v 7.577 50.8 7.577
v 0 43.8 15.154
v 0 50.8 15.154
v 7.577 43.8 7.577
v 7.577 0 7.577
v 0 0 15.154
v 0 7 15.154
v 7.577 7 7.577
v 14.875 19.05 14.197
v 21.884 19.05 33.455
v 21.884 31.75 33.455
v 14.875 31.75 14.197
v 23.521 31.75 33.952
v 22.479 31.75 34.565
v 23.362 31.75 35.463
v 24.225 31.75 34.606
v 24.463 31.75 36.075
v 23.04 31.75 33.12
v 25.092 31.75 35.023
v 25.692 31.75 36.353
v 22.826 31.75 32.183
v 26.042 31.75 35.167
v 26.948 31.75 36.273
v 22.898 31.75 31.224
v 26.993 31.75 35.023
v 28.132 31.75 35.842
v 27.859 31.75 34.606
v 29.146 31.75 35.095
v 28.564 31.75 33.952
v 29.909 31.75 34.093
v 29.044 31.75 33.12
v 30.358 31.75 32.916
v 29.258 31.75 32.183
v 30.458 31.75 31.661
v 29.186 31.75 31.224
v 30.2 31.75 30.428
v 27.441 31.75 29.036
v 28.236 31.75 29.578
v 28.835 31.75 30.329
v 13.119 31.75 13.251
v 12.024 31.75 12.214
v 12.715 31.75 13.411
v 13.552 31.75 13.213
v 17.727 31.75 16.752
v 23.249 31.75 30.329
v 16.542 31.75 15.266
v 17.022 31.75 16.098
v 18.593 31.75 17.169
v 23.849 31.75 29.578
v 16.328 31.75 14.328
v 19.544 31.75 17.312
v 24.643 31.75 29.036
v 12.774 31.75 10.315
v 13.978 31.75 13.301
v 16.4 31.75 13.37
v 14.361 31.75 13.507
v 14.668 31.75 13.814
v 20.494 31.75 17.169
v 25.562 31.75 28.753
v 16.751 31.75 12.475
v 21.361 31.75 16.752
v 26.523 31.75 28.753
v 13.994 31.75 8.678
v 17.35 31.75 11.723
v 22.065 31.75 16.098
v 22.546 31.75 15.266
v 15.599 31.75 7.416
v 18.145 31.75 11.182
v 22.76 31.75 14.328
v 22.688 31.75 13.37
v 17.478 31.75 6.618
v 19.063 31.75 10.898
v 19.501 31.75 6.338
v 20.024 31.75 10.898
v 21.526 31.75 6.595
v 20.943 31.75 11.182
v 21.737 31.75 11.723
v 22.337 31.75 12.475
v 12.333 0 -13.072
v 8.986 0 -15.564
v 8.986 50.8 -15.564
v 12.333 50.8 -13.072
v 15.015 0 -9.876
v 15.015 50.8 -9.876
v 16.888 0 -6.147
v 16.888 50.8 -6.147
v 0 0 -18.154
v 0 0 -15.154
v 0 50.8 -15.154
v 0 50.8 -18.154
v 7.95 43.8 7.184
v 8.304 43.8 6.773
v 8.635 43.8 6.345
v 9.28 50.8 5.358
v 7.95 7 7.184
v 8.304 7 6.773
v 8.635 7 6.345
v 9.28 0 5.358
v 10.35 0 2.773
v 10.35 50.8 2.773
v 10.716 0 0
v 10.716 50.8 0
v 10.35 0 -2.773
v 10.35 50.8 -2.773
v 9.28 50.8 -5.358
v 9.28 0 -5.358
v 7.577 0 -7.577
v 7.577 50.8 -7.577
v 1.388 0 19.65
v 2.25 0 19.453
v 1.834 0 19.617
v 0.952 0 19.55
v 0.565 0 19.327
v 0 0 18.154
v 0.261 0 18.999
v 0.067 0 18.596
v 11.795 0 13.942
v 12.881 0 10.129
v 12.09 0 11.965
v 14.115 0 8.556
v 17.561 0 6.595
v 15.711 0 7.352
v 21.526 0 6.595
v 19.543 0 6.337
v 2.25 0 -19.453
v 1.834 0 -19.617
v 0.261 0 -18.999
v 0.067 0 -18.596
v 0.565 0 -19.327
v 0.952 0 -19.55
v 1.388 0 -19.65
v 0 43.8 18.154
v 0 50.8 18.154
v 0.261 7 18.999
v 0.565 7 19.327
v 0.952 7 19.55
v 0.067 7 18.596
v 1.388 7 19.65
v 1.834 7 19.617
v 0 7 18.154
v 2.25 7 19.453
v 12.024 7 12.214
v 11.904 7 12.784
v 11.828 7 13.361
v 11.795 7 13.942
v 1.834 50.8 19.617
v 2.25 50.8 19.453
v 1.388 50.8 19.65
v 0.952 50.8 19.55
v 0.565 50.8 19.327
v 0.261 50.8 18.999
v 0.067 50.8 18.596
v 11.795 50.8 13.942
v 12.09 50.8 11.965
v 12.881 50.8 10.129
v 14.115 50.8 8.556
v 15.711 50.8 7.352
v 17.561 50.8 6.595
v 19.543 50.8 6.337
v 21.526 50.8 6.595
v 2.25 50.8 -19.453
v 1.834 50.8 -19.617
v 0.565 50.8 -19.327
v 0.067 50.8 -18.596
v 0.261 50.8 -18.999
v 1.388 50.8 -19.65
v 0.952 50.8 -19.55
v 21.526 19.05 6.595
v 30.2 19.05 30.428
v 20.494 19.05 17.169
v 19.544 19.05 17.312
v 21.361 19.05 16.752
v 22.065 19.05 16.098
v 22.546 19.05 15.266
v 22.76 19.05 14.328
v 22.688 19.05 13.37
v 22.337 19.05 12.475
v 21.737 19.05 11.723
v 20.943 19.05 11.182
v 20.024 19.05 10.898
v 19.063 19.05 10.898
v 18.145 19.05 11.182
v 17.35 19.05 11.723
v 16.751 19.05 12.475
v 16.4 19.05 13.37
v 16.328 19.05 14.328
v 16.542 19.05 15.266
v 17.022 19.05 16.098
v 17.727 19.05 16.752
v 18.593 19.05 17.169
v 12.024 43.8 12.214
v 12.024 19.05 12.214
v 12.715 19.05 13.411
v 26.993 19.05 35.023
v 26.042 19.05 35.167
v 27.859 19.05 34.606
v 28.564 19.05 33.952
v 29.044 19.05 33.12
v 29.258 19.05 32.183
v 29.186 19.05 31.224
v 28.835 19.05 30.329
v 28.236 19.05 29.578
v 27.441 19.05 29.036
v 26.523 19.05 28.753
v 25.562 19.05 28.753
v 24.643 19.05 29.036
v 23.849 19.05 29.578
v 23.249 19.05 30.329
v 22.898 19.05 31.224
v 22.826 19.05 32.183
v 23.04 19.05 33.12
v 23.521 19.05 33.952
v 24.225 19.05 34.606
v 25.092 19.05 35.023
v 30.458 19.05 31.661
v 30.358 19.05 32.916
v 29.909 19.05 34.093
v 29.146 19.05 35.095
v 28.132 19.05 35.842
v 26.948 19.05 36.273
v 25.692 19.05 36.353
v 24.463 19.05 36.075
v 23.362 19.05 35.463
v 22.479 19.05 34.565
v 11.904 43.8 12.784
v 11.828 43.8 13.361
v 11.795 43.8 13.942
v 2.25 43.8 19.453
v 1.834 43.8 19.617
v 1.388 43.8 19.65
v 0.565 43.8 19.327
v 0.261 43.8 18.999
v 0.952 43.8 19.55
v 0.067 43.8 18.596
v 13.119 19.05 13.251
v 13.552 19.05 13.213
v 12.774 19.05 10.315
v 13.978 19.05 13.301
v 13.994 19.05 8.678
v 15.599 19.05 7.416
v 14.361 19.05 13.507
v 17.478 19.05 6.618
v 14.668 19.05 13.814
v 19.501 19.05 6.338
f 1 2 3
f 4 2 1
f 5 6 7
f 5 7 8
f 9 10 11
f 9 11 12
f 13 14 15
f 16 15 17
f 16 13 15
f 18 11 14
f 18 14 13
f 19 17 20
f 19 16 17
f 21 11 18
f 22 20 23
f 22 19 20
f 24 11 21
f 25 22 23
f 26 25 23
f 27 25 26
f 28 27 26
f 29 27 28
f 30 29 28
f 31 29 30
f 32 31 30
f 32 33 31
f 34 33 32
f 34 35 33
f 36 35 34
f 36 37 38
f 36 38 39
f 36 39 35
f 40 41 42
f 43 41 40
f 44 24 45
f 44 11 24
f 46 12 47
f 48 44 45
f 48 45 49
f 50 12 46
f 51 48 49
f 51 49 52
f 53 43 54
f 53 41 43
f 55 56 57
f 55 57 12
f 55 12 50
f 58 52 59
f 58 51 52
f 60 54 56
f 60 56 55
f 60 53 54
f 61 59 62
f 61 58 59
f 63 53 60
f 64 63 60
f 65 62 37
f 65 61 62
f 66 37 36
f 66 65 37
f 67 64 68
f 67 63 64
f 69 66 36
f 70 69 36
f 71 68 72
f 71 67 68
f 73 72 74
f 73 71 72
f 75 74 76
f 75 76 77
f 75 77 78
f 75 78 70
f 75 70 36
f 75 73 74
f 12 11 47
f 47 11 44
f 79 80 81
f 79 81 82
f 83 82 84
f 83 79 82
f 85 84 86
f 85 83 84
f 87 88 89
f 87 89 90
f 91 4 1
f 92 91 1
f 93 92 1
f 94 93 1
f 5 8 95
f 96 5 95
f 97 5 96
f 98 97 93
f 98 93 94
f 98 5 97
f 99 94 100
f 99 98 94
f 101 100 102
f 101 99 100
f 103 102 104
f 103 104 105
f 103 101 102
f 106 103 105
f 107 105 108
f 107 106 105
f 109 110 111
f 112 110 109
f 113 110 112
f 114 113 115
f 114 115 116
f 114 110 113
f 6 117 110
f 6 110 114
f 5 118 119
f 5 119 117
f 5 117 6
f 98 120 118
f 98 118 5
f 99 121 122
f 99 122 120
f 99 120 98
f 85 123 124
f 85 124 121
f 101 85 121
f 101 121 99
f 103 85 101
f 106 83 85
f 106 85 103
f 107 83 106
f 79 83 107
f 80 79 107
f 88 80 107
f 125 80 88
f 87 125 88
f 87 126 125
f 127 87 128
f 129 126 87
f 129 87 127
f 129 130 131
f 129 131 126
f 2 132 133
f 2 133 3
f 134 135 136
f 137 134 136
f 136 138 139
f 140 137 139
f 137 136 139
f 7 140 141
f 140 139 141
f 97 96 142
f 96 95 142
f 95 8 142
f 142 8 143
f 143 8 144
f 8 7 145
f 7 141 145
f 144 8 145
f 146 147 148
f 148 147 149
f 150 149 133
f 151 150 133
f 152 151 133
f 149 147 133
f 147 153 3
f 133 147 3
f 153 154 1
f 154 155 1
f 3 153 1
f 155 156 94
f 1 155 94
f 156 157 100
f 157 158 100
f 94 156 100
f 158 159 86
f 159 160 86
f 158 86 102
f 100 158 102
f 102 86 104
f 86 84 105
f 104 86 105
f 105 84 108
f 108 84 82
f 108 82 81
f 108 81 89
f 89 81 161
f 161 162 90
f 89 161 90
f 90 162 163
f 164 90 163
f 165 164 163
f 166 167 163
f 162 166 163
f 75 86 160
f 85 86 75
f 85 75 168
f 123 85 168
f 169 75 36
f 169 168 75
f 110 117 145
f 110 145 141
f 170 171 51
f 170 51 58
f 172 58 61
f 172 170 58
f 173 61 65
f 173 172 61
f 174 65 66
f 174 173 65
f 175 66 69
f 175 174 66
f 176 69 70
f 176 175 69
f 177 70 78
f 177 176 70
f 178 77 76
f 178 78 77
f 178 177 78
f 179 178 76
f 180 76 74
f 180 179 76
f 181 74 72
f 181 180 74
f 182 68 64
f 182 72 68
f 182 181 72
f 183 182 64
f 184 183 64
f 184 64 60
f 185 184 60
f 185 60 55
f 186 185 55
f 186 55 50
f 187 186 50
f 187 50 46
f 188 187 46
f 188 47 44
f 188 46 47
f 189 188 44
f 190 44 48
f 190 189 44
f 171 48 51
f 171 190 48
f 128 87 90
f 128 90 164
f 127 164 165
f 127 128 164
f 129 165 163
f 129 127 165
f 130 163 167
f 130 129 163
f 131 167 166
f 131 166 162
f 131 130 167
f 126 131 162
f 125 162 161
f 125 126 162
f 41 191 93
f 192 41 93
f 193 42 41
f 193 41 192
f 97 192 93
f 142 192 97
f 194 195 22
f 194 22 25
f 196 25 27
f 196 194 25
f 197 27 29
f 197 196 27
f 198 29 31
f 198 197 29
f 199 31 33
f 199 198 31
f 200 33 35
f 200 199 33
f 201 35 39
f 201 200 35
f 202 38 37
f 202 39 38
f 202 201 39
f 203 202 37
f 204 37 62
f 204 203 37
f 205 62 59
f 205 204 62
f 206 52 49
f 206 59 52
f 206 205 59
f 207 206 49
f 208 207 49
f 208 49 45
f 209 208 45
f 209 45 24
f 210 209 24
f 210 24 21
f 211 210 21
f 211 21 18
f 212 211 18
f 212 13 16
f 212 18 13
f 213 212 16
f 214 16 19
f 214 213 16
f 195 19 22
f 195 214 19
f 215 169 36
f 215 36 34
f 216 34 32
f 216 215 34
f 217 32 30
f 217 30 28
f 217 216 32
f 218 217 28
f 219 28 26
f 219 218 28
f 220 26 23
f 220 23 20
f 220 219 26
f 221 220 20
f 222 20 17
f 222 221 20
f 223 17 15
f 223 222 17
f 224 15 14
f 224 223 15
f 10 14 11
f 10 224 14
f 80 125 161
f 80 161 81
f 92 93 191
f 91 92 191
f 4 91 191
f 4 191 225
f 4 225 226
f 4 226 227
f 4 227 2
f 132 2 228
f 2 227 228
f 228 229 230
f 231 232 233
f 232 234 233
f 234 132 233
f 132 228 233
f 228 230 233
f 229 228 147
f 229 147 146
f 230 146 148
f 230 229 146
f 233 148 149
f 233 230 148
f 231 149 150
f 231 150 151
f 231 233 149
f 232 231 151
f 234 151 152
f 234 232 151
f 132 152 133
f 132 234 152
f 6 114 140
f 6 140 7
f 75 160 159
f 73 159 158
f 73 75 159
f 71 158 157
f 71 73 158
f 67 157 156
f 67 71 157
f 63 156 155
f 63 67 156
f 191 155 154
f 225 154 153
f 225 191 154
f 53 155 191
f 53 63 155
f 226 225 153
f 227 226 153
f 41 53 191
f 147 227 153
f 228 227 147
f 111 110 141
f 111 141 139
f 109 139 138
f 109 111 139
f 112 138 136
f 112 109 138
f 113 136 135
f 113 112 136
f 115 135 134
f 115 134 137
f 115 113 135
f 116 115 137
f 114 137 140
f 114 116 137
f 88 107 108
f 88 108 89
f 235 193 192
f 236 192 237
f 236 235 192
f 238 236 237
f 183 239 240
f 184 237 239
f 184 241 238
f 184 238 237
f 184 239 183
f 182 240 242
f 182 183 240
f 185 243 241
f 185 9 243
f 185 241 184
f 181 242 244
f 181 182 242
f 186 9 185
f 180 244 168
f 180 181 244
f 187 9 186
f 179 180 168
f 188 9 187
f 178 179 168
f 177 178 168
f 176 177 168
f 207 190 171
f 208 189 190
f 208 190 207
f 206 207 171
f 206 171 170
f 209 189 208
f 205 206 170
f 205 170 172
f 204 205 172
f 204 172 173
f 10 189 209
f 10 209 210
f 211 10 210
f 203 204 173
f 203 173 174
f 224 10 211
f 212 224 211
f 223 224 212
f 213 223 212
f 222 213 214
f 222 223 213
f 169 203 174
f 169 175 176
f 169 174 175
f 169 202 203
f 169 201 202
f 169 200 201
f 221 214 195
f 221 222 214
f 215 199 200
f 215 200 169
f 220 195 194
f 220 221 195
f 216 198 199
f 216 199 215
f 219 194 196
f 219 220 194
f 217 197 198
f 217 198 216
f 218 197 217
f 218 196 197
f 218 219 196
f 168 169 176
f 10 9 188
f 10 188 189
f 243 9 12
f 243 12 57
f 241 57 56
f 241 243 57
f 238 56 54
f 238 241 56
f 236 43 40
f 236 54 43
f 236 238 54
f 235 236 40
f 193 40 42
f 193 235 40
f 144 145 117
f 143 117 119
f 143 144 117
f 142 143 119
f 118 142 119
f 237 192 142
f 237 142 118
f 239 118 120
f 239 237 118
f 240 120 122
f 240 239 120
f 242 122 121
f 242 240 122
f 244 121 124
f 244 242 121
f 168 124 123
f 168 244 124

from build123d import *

# Parameters (mm, degrees)
SKETCH1_R           = 3.225
BOSS_EXTRUDE1_DEPTH = 50.8
SKETCH2_W           = 254
SKETCH2_H           = 19.05
CUT_EXTRUDE1_DEPTH  = 66.440170121
CUT_EXTRUDE4_DEPTH  = 10
SKETCH3_R           = 7.75
CUT_EXTRUDE2_DEPTH  = 58.086264546
SKETCH4_R           = 7.75
CUT_EXTRUDE3_DEPTH  = 58.086264546


with BuildPart() as part:
    # Sketch1 → Boss-Extrude1 (new body)
    with BuildSketch(Plane(origin=(0, 0, 0), x_dir=(1, 0, 0), z_dir=(0, 1, 0))):
        with BuildLine():
            Line((7.577091102, 7.577091102), (0, 15.154182204))
            Line((0, 15.154182204), (0, 18.154182204))
            ThreePointArc((0, 18.154182204), (0.75, 19.45322031), (2.25, 19.45322031))
            Line((2.25, 19.45322031), (8.985991487, 15.564193812))
            ThreePointArc((8.985991487, 15.564193812), (13.767337689, 11.552167977), (16.888139781, 6.146780193))
            Line((16.888139781, 6.146780193), (30.200329071, -30.428159285))
            ThreePointArc((30.200329071, -30.428159285), (27.555628359, -36.099738267), (21.884049378, -33.455037554))
            Line((21.884049378, -33.455037554), (14.874746988, -14.197137512))
            ThreePointArc((14.874746988, -14.197137512), (13.978238272, -13.300628796), (12.715208057, -13.411129621))
            Line((12.715208057, -13.411129621), (2.25, -19.45322031))
            ThreePointArc((2.25, -19.45322031), (0.75, -19.45322031), (0, -18.154182204))
            Line((0, -18.154182204), (0, -15.154182204))
            Line((0, -15.154182204), (7.577091102, -7.577091102))
            ThreePointArc((7.577091102, -7.577091102), (10.715625, 0), (7.577091102, 7.577091102))
        make_face()
        with Locations(Location((26.042189225, -31.94159842, 0), (0, 0, 270))):
            Circle(SKETCH1_R, mode=Mode.SUBTRACT)
        with Locations(Location((19.543806501, -14.087438625, 0), (0, 0, 270))):
            Circle(SKETCH1_R, mode=Mode.SUBTRACT)
    extrude(amount=BOSS_EXTRUDE1_DEPTH)

    # Sketch2 → Cut-Extrude1 (cut, through all)
    with BuildSketch(Plane(origin=(8.985991487, 0, 15.564193812), x_dir=(0.8660254037844355, 0, -0.5000000000000056), z_dir=(0.5000000000000056, 0, 0.8660254037844356))):
        with Locations((-1.735962308, 41.275)):
            Rectangle(SKETCH2_W, SKETCH2_H)
        with Locations((-1.735962308, 9.525)):
            Rectangle(SKETCH2_W, SKETCH2_H)
    extrude(amount=CUT_EXTRUDE1_DEPTH, mode=Mode.SUBTRACT)

    # Sketch5 → Cut-Extrude4 (cut)
    with BuildSketch(Plane(origin=(8.985991487, 0, 15.564193812), x_dir=(0.8660254037844355, 0, -0.5000000000000057), z_dir=(0.5000000000000056, 0, 0.8660254037844354))):
        Polygon((4.306128381, 7), (-7.778052996, 7), (-10.778052996, 7), (-10.778052996, 43.8), (-7.778052996, 43.8), (4.306128381, 43.8), align=None)
    extrude(amount=-CUT_EXTRUDE4_DEPTH, mode=Mode.SUBTRACT)

    # Sketch3 → Cut-Extrude2 (cut, through all)
    with BuildSketch(Plane(origin=(0, 31.75, 0), x_dir=(1, 0, 0), z_dir=(0, 1, 0))):
        with Locations((19.543806501, -14.087438625)):
            Circle(SKETCH3_R)
    extrude(amount=CUT_EXTRUDE2_DEPTH, mode=Mode.SUBTRACT)

    # Sketch4 → Cut-Extrude3 (cut, through all)
    with BuildSketch(Plane.XZ.offset(-19.05)):
        with Locations((19.543806501, 14.087438625)):
            Circle(SKETCH4_R)
    extrude(amount=CUT_EXTRUDE3_DEPTH, mode=Mode.SUBTRACT)


solid = part.part
